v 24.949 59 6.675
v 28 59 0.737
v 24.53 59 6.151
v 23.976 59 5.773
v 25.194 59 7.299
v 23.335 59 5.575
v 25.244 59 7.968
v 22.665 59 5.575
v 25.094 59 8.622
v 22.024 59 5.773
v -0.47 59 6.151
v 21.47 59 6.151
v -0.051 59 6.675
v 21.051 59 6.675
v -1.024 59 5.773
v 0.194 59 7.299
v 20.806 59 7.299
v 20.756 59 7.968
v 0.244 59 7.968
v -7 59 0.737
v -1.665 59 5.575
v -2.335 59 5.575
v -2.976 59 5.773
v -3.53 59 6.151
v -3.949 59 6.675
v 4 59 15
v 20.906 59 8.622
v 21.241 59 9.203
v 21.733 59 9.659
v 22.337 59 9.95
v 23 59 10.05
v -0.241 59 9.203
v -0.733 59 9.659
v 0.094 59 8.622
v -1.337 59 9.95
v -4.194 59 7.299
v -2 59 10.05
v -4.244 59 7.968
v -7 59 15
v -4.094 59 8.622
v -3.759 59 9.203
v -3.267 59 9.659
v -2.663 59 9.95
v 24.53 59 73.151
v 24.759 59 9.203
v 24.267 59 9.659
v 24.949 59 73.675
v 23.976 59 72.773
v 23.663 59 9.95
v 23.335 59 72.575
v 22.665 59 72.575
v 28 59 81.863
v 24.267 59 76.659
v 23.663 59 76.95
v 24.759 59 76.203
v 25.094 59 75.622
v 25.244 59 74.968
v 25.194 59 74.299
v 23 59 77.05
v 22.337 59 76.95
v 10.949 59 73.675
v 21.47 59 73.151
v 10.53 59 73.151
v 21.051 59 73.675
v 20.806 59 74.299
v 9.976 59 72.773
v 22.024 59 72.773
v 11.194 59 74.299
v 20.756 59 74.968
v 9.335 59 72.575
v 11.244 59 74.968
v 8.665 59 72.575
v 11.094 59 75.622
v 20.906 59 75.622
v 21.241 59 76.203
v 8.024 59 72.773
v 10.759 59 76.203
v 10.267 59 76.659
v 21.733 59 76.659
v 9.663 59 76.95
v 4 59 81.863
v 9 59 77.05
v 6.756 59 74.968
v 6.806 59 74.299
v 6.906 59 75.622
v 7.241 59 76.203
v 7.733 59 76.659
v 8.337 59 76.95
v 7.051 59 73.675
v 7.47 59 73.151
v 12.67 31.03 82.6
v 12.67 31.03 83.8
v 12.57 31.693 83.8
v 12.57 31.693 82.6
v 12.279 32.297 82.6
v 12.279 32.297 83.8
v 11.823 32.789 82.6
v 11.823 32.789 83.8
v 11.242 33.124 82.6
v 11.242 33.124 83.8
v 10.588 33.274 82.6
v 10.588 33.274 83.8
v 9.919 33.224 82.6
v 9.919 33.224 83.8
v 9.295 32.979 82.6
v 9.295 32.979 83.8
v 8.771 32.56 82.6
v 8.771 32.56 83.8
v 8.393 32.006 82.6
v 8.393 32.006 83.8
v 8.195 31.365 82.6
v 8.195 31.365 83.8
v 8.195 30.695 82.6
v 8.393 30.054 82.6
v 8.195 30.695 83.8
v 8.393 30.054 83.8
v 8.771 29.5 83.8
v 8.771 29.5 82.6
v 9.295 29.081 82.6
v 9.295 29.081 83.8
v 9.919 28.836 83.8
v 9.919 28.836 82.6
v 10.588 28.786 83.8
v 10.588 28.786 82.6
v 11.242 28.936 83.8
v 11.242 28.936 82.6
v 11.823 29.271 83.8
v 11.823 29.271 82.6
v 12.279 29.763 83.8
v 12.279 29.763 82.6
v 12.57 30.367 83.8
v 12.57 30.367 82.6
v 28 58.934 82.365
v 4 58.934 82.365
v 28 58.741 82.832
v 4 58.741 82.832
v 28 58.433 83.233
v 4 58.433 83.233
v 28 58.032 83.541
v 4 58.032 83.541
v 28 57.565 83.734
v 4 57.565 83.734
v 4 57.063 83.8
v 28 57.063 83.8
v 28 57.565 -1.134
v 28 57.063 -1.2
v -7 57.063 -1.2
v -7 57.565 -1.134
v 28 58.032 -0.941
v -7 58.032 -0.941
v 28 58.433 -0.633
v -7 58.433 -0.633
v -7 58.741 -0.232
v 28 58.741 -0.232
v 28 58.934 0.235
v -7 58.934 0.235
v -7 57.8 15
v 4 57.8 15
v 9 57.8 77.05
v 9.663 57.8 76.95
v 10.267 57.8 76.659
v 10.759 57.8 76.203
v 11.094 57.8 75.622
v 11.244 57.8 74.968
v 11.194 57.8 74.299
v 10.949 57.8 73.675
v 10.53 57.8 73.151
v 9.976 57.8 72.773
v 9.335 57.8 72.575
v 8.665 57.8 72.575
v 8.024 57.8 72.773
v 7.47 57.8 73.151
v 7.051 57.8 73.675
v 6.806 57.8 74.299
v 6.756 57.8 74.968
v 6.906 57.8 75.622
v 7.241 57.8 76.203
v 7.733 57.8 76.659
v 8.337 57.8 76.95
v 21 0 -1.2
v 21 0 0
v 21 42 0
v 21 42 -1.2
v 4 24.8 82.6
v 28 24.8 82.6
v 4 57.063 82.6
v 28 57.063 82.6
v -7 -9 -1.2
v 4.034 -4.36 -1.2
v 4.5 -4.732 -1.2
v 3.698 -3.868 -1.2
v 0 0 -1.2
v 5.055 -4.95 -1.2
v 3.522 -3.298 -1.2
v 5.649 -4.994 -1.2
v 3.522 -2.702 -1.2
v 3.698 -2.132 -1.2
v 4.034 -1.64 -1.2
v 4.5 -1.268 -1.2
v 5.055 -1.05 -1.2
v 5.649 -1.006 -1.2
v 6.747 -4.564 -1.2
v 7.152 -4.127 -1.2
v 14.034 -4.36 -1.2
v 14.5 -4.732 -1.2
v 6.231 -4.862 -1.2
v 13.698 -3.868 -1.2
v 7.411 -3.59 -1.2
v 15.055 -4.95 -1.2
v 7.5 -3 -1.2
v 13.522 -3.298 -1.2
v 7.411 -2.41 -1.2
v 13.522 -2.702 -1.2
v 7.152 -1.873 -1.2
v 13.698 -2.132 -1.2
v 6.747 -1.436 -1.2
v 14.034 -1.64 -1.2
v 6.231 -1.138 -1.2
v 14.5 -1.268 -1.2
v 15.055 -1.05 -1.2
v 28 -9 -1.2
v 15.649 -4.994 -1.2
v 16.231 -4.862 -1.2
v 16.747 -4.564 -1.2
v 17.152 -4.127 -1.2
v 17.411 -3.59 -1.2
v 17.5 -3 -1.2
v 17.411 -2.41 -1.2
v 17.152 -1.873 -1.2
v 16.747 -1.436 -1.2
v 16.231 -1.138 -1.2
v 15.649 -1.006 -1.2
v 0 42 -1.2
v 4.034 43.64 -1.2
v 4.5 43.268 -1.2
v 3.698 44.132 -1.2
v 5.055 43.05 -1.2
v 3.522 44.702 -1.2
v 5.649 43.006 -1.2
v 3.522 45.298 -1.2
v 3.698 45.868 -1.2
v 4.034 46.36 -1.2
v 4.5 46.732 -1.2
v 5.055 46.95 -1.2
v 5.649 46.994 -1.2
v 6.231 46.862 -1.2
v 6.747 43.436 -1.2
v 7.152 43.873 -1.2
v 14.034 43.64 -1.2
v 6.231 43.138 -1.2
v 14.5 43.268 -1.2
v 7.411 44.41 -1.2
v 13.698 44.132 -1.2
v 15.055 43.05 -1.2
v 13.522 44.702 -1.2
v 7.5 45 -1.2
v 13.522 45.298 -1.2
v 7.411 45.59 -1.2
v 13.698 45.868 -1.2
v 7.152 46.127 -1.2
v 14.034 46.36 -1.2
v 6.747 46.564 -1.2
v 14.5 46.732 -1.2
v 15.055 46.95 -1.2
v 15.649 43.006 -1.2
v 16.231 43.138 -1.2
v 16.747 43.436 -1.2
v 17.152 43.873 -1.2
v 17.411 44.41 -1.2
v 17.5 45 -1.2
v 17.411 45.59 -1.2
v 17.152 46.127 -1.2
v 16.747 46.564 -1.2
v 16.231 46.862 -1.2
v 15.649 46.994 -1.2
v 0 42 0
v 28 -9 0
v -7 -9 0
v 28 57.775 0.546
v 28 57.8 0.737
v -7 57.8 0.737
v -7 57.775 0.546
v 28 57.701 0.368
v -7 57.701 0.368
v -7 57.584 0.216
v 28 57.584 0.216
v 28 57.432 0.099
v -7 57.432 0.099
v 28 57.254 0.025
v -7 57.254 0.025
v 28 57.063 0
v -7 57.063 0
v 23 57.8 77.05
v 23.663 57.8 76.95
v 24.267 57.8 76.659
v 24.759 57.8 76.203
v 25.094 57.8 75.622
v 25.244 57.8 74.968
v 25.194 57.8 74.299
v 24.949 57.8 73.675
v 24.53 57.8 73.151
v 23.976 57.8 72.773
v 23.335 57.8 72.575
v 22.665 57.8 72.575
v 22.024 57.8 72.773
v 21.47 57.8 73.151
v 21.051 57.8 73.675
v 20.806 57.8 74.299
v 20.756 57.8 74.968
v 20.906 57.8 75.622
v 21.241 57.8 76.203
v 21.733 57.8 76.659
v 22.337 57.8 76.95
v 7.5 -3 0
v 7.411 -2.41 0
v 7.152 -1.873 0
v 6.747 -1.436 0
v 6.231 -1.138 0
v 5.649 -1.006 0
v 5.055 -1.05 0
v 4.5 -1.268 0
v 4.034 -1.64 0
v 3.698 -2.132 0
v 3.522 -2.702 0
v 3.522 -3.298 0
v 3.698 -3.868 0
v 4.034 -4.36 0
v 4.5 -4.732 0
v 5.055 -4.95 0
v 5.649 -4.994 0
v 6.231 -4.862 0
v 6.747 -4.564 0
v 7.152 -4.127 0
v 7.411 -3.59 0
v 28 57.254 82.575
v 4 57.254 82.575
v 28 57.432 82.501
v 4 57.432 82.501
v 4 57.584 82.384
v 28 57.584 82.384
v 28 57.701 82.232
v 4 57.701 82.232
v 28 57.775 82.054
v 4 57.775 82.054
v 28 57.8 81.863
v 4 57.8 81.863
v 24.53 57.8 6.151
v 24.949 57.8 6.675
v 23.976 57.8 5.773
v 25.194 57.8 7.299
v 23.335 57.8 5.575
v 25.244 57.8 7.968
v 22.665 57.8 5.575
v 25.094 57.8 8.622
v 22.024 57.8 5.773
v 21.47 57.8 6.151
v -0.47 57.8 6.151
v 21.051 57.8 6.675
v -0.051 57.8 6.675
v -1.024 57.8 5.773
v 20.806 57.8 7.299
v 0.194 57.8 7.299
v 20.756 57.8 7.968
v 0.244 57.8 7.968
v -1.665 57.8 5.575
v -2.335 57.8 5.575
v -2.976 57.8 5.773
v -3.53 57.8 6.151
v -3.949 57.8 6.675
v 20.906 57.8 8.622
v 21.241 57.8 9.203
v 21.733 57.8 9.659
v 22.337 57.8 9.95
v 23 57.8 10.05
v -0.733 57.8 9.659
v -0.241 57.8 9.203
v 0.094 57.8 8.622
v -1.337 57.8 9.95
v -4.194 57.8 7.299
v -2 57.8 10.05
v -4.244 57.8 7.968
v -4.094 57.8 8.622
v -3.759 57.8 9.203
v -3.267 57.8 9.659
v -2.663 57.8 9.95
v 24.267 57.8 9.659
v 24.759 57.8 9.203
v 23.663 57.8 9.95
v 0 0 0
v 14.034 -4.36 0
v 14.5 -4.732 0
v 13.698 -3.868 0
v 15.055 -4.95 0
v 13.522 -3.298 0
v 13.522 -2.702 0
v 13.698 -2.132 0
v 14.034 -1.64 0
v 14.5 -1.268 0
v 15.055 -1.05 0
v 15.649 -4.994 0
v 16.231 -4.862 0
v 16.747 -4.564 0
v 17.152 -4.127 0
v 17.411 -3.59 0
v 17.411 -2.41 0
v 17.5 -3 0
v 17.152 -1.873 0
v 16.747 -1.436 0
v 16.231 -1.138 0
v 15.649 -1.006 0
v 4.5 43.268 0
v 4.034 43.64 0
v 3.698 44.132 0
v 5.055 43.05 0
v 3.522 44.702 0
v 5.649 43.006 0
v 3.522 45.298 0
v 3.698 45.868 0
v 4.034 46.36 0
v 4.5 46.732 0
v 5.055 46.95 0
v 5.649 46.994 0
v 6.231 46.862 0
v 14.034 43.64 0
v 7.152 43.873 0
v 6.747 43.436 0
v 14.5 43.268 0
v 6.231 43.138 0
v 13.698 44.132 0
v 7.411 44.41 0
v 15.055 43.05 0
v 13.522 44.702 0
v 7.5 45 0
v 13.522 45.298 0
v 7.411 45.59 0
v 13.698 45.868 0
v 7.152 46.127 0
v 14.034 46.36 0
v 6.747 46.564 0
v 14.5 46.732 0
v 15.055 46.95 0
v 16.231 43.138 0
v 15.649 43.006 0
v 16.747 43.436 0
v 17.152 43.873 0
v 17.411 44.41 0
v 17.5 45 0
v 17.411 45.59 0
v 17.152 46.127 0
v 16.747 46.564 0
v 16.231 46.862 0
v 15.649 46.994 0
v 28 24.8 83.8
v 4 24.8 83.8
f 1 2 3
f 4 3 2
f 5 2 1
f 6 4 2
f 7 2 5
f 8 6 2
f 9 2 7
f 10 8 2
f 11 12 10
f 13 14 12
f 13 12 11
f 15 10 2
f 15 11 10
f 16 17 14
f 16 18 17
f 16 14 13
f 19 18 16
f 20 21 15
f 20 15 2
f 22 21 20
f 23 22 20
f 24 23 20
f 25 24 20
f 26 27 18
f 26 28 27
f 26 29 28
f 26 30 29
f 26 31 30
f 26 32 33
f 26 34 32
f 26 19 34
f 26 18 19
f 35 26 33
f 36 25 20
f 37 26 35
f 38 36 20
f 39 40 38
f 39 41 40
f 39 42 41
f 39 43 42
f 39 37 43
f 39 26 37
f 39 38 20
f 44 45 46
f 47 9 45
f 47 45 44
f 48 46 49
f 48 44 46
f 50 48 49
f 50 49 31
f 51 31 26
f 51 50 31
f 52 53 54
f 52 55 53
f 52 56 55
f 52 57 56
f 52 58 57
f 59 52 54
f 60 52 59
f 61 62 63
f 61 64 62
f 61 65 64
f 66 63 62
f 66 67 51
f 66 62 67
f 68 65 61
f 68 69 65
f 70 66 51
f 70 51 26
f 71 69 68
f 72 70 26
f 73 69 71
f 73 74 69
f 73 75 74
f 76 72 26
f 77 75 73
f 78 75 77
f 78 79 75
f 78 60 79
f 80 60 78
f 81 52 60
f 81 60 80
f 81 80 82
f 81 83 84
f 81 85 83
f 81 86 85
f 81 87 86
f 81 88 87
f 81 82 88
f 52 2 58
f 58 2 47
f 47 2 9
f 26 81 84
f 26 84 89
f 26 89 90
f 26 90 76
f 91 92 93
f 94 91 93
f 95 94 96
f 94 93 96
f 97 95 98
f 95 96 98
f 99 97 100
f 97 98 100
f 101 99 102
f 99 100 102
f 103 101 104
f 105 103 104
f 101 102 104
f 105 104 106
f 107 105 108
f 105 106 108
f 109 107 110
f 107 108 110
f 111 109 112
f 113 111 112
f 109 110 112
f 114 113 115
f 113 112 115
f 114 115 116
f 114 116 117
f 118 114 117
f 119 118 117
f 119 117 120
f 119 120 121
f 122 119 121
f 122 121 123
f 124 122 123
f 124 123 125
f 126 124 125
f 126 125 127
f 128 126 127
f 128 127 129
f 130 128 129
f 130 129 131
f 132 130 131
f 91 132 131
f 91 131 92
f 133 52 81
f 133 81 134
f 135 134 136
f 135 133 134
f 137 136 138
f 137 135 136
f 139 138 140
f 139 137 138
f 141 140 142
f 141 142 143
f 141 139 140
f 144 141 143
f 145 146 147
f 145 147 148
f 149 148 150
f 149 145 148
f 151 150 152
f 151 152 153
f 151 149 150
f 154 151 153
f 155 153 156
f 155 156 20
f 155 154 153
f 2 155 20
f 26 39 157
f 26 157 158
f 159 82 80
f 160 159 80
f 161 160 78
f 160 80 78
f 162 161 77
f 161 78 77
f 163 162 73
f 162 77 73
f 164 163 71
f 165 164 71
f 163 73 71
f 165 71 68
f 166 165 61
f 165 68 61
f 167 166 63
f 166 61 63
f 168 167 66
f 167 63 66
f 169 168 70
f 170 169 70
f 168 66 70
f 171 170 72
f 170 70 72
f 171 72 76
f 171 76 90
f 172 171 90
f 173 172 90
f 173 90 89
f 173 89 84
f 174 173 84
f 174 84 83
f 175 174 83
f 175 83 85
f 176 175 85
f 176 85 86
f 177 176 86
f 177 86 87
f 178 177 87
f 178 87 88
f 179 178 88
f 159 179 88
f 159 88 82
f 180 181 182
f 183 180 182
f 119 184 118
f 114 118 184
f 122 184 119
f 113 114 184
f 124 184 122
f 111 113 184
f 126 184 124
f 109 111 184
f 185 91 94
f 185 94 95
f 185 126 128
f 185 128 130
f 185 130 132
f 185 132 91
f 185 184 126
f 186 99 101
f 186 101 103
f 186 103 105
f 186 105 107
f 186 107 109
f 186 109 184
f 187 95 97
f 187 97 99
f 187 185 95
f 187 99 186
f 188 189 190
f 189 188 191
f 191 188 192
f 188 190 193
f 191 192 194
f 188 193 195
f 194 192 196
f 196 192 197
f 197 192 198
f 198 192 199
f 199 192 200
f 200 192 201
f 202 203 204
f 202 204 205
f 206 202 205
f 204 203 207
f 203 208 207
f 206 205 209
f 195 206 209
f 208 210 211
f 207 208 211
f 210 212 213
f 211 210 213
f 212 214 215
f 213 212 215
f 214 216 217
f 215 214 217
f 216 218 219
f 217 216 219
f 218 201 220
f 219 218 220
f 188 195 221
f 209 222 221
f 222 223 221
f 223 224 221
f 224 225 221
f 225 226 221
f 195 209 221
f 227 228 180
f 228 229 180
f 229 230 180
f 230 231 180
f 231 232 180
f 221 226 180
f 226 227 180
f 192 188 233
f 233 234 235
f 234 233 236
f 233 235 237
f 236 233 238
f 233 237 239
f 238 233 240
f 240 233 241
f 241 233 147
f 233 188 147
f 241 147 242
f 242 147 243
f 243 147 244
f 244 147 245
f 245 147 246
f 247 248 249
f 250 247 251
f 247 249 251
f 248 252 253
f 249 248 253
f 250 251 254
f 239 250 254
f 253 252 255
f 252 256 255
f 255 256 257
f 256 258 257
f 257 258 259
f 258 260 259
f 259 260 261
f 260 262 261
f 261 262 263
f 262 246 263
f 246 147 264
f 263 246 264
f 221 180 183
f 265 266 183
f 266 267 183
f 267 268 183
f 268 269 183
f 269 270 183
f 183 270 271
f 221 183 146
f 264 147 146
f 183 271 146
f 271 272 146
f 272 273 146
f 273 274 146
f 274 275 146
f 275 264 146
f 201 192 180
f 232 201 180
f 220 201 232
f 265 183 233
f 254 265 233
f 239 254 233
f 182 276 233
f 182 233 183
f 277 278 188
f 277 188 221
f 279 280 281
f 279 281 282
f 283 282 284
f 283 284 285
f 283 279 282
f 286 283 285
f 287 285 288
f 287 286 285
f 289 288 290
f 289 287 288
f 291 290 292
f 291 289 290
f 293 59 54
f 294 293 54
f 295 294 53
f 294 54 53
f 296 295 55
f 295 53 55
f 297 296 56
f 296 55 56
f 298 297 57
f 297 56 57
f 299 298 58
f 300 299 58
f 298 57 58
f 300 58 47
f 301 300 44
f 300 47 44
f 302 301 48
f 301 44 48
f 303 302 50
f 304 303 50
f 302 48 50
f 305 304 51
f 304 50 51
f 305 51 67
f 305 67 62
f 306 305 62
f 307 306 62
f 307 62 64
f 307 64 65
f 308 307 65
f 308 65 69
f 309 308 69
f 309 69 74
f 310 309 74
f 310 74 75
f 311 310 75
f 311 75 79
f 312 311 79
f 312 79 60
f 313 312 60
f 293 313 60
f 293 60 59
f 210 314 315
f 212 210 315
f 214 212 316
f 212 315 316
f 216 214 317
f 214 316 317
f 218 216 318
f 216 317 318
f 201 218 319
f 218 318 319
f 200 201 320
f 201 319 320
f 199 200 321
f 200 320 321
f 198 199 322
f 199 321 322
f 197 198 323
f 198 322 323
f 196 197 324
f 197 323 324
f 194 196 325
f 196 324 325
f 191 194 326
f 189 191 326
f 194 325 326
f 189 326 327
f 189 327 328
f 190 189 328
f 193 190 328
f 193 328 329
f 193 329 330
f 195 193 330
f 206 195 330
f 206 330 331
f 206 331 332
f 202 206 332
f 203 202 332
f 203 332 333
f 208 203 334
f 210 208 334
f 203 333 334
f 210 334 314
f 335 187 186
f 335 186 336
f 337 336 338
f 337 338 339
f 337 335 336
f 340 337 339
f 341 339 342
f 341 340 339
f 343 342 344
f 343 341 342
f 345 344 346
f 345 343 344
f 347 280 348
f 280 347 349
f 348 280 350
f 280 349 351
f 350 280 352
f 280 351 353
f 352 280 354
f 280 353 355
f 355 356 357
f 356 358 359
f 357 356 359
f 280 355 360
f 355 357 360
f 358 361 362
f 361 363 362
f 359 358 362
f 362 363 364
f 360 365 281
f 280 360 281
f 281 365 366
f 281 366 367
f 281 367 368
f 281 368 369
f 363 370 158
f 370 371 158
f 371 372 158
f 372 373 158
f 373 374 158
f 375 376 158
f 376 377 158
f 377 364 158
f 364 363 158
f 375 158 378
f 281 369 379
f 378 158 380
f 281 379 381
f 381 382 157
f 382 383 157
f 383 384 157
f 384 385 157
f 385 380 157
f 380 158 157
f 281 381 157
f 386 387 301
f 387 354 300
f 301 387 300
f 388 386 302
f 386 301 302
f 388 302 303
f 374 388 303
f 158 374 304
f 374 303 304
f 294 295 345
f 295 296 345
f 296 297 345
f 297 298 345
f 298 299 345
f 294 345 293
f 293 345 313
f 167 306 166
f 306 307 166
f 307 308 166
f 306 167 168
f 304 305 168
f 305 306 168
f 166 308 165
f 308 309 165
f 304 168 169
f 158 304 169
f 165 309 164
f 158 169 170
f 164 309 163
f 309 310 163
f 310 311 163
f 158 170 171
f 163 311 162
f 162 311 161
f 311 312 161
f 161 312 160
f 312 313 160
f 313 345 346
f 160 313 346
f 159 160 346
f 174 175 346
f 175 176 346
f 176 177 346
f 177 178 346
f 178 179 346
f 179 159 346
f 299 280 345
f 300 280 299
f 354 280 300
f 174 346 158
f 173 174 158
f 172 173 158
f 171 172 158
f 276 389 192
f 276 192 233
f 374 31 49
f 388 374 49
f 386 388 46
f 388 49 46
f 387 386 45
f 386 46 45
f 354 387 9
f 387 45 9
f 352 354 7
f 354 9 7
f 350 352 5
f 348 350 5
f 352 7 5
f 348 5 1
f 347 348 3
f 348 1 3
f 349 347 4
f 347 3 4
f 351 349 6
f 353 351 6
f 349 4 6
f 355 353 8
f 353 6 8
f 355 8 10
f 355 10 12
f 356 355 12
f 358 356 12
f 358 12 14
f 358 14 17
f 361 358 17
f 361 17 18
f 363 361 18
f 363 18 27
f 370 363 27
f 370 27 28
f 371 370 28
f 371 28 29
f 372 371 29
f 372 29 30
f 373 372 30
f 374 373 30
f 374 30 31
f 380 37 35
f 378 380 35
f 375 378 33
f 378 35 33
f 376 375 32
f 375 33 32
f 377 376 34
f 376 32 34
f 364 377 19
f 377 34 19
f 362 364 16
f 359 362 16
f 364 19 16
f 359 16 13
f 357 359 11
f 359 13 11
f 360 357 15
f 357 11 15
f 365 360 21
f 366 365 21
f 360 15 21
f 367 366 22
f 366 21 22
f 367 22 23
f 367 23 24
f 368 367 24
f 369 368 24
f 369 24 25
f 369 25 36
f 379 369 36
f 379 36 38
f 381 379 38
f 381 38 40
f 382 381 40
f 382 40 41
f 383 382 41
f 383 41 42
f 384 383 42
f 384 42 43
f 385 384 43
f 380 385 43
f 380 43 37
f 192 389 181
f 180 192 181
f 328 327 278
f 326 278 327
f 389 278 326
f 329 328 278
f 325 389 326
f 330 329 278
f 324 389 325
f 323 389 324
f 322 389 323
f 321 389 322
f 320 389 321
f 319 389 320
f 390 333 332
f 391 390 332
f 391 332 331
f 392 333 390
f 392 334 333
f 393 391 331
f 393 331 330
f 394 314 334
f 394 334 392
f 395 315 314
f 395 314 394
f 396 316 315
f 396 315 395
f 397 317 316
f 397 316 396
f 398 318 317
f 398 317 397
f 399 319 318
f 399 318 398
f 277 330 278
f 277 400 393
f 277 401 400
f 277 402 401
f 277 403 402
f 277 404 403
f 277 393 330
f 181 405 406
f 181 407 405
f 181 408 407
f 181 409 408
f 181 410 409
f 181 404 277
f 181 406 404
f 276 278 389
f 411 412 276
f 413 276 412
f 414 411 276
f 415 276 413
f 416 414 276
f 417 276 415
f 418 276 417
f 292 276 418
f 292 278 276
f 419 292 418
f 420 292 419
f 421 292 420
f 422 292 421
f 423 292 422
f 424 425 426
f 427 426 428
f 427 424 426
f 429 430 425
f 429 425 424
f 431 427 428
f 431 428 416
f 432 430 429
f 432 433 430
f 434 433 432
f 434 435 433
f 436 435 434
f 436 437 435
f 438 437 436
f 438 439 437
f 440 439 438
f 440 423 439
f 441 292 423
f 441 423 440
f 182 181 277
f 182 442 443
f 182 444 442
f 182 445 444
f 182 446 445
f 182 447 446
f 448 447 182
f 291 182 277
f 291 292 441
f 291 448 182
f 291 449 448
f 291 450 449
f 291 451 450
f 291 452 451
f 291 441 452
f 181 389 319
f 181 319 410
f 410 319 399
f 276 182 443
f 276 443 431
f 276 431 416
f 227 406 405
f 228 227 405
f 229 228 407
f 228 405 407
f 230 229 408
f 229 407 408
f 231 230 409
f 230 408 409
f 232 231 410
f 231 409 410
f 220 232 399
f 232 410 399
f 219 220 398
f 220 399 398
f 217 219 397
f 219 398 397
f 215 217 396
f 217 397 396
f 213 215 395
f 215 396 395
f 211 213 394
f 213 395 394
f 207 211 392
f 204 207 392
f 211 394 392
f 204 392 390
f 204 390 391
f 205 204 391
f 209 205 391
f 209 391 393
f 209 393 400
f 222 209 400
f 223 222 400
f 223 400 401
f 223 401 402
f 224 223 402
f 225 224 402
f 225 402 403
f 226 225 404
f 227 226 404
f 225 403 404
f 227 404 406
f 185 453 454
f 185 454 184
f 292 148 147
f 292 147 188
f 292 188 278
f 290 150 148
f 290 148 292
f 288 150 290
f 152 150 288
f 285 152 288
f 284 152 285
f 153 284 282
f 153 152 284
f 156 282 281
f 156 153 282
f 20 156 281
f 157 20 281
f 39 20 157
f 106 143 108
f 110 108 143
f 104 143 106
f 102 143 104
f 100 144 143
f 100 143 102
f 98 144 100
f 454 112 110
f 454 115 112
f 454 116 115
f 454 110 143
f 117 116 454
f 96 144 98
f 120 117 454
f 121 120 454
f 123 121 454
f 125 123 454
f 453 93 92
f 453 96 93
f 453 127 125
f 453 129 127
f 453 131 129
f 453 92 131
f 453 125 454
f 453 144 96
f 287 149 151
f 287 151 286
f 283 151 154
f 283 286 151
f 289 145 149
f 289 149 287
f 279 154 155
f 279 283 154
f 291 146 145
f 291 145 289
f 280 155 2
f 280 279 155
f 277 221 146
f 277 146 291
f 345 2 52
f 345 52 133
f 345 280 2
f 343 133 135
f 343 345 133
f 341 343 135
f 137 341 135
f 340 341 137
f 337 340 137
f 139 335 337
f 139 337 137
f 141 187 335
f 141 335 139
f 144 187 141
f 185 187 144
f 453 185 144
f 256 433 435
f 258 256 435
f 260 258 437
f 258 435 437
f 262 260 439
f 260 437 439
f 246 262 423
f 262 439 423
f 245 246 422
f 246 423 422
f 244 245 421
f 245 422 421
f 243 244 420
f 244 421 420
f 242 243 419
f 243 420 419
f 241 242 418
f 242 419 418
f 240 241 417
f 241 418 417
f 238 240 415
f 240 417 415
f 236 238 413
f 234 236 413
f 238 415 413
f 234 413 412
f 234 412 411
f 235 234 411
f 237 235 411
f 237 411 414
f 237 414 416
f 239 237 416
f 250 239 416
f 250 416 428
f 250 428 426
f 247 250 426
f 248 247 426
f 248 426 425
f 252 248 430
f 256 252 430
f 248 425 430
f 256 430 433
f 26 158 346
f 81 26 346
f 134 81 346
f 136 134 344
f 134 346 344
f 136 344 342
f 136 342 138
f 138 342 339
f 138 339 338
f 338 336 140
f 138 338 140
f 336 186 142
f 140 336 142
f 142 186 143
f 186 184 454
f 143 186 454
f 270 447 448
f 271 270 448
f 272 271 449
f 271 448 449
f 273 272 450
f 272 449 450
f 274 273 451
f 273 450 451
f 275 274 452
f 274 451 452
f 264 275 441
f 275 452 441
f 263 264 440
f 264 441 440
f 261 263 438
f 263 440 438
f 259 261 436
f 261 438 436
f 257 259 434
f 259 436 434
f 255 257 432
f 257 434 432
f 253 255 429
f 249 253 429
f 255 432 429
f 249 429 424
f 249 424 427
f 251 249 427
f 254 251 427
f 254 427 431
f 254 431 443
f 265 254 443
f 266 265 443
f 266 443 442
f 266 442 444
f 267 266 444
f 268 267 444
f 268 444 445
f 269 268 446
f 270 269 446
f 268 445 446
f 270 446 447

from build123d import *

# Parameters (mm, degrees)
SKETCH_1_W                       = 35
SKETCH_1_H                       = 68
SKETCH_1_R                       = 2
SKETCH_1_W_2                     = 21
SKETCH_1_H_2                     = 42
SM_BASE_FLANGE_1_DEPTH           = 1.2
SM_EDGE_FLANGE_1_STRIP_W         = 6.2732
SM_EDGE_FLANGE_1_STRIP_H         = 1.2
SM_EDGE_FLANGE_1_STRIP_CUT_DEPTH = 35
SM_EDGE_FLANGE_1_DEPTH           = 35
SM_EDGE_FLANGE_1_FLAT_DEPTH      = 1.2
SM_EDGE_FLANGE_2_STRIP_W         = 6.2732
SM_EDGE_FLANGE_2_STRIP_H         = 1.2
SM_EDGE_FLANGE_2_STRIP_CUT_DEPTH = 24
SM_EDGE_FLANGE_2_DEPTH           = 24
CUT_EXTRUDE_1_REACH              = 109.191
SKETCH_12_R                      = 2.25
CUT_EXTRUDE_2_REACH              = 113.492
SKETCH_13_R                      = 2.25


# Sheet-metal steps are written as plain solids
with BuildPart() as part:
    # Sketch 1 → Базовая кромка1 (new body)
    with BuildSketch(Plane.XY):
        with Locations((10.5, 25)):
            Rectangle(SKETCH_1_W, SKETCH_1_H)
        with Locations((5.5, 45)):
            Circle(SKETCH_1_R, mode=Mode.SUBTRACT)
        with Locations((15.5, 45)):
            Circle(SKETCH_1_R, mode=Mode.SUBTRACT)
        with Locations((5.5, -3)):
            Circle(SKETCH_1_R, mode=Mode.SUBTRACT)
        with Locations((15.5, -3)):
            Circle(SKETCH_1_R, mode=Mode.SUBTRACT)
        with Locations((10.5, 21)):
            Rectangle(SKETCH_1_W_2, SKETCH_1_H_2, mode=Mode.SUBTRACT)
    extrude(amount=-SM_BASE_FLANGE_1_DEPTH)

    # Ребро-кромка1 strip (across the edge) → Ребро-кромка1 strip cut (cut)
    with BuildSketch(Plane(origin=(28, 59, 0), x_dir=(0, -1, 0), z_dir=(-1, 0, 0))):
        with Locations((-1.2, -0.6)):
            Rectangle(SM_EDGE_FLANGE_1_STRIP_W, SM_EDGE_FLANGE_1_STRIP_H)
    extrude(amount=SM_EDGE_FLANGE_1_STRIP_CUT_DEPTH, mode=Mode.SUBTRACT)

    # Ребро-кромка1 bend section (across the edge) → Ребро-кромка1 (add)
    with BuildSketch(Plane(origin=(28, 59, 0), x_dir=(0, -1, 0), z_dir=(-1, 0, 0))):
        with BuildLine():
            Line((0, 0.7366), (1.2, 0.7366))
            ThreePointArc((1.2, 0.7366), (1.415745145, 0.215745145), (1.9366, 0))
            Line((1.9366, 0), (1.9366, -1.2))
            ThreePointArc((1.9366, -1.2), (0.567217008, -0.632782992), (0, 0.7366))
        make_face()
    extrude(amount=SM_EDGE_FLANGE_1_DEPTH)

    # Ребро-кромка1 profile (on flange) → Ребро-кромка1 flat (add)
    with BuildSketch(Plane(origin=(0, 59, 0), x_dir=(-1, 0, 0), z_dir=(0, 1, 0))):
        Polygon((-28, 83.8), (-28, 0.7366), (7, 0.7366), (7, 15), (-4, 15), (-4, 83.8), align=None)
    extrude(amount=-SM_EDGE_FLANGE_1_FLAT_DEPTH)

    # Ребро-кромка2 strip (across the edge) → Ребро-кромка2 strip cut (cut)
    with BuildSketch(Plane(origin=(28, 57.8, 83.8), x_dir=(0, 0, -1), z_dir=(-1, 0, 0))):
        with Locations((-1.2, -0.6)):
            Rectangle(SM_EDGE_FLANGE_2_STRIP_W, SM_EDGE_FLANGE_2_STRIP_H)
    extrude(amount=SM_EDGE_FLANGE_2_STRIP_CUT_DEPTH, mode=Mode.SUBTRACT)

    # Ребро-кромка2 section (across the edge) → Ребро-кромка2 (add)
    with BuildSketch(Plane(origin=(28, 57.8, 83.8), x_dir=(0, 0, -1), z_dir=(-1, 0, 0))):
        with BuildLine():
            Line((0, 0.7366), (0, 33))
            Line((0, 33), (1.2, 33))
            Line((1.2, 33), (1.2, 0.7366))
            ThreePointArc((1.2, 0.7366), (1.415745145, 0.215745145), (1.9366, 0))
            Line((1.9366, 0), (1.9366, -1.2))
            ThreePointArc((1.9366, -1.2), (0.567217008, -0.632782992), (0, 0.7366))
        make_face()
    extrude(amount=SM_EDGE_FLANGE_2_DEPTH)

    # Эскиз12 → Вырез-Вытянуть1 (cut, up to next)
    with BuildSketch(Plane.XY.offset(83.8), mode=Mode.PRIVATE) as cut_extrude_1_sk1:
        with Locations((10.419999997, 31.03)):
            Circle(SKETCH_12_R)
    cut_extrude_1_tool1 = extrude(cut_extrude_1_sk1.sketch, amount=-CUT_EXTRUDE_1_REACH, mode=Mode.PRIVATE) & part.part
    add(cut_extrude_1_tool1.solids().sort_by_distance((10.42, 31.03, 83.8))[0], mode=Mode.SUBTRACT)

    # Эскиз13 → Вырез-Вытянуть2 (cut, up to next)
    with BuildSketch(Plane(origin=(0, 59, 0), x_dir=(1, 0, 0), z_dir=(0, 1, 0)), mode=Mode.PRIVATE) as cut_extrude_2_sk1:
        with Locations(Location((23, -7.8, 0), (0, 0, 270))):
            Circle(SKETCH_13_R)
    cut_extrude_2_tool1 = extrude(cut_extrude_2_sk1.sketch, amount=-CUT_EXTRUDE_2_REACH, mode=Mode.PRIVATE) & part.part
    # Эскиз13 → Вырез-Вытянуть2 (cut, up to next)
    with BuildSketch(Plane(origin=(0, 59, 0), x_dir=(1, 0, 0), z_dir=(0, 1, 0)), mode=Mode.PRIVATE) as cut_extrude_2_sk2:
        with Locations(Location((-2, -7.8, 0), (0, 0, 270))):
            Circle(SKETCH_13_R)
    cut_extrude_2_tool2 = extrude(cut_extrude_2_sk2.sketch, amount=-CUT_EXTRUDE_2_REACH, mode=Mode.PRIVATE) & part.part
    # Эскиз13 → Вырез-Вытянуть2 (cut, up to next)
    with BuildSketch(Plane(origin=(0, 59, 0), x_dir=(1, 0, 0), z_dir=(0, 1, 0)), mode=Mode.PRIVATE) as cut_extrude_2_sk3:
        with Locations(Location((9, -74.8, 0), (0, 0, 270))):
            Circle(SKETCH_13_R)
    cut_extrude_2_tool3 = extrude(cut_extrude_2_sk3.sketch, amount=-CUT_EXTRUDE_2_REACH, mode=Mode.PRIVATE) & part.part
    # Эскиз13 → Вырез-Вытянуть2 (cut, up to next)
    with BuildSketch(Plane(origin=(0, 59, 0), x_dir=(1, 0, 0), z_dir=(0, 1, 0)), mode=Mode.PRIVATE) as cut_extrude_2_sk4:
        with Locations(Location((23, -74.8, 0), (0, 0, 270))):
            Circle(SKETCH_13_R)
    cut_extrude_2_tool4 = extrude(cut_extrude_2_sk4.sketch, amount=-CUT_EXTRUDE_2_REACH, mode=Mode.PRIVATE) & part.part
    add(cut_extrude_2_tool1.solids().sort_by_distance((23, 59, 7.8))[0], mode=Mode.SUBTRACT)
    add(cut_extrude_2_tool2.solids().sort_by_distance((-2, 59, 7.8))[0], mode=Mode.SUBTRACT)
    add(cut_extrude_2_tool3.solids().sort_by_distance((9, 59, 74.8))[0], mode=Mode.SUBTRACT)
    add(cut_extrude_2_tool4.solids().sort_by_distance((23, 59, 74.8))[0], mode=Mode.SUBTRACT)


solid = part.part
